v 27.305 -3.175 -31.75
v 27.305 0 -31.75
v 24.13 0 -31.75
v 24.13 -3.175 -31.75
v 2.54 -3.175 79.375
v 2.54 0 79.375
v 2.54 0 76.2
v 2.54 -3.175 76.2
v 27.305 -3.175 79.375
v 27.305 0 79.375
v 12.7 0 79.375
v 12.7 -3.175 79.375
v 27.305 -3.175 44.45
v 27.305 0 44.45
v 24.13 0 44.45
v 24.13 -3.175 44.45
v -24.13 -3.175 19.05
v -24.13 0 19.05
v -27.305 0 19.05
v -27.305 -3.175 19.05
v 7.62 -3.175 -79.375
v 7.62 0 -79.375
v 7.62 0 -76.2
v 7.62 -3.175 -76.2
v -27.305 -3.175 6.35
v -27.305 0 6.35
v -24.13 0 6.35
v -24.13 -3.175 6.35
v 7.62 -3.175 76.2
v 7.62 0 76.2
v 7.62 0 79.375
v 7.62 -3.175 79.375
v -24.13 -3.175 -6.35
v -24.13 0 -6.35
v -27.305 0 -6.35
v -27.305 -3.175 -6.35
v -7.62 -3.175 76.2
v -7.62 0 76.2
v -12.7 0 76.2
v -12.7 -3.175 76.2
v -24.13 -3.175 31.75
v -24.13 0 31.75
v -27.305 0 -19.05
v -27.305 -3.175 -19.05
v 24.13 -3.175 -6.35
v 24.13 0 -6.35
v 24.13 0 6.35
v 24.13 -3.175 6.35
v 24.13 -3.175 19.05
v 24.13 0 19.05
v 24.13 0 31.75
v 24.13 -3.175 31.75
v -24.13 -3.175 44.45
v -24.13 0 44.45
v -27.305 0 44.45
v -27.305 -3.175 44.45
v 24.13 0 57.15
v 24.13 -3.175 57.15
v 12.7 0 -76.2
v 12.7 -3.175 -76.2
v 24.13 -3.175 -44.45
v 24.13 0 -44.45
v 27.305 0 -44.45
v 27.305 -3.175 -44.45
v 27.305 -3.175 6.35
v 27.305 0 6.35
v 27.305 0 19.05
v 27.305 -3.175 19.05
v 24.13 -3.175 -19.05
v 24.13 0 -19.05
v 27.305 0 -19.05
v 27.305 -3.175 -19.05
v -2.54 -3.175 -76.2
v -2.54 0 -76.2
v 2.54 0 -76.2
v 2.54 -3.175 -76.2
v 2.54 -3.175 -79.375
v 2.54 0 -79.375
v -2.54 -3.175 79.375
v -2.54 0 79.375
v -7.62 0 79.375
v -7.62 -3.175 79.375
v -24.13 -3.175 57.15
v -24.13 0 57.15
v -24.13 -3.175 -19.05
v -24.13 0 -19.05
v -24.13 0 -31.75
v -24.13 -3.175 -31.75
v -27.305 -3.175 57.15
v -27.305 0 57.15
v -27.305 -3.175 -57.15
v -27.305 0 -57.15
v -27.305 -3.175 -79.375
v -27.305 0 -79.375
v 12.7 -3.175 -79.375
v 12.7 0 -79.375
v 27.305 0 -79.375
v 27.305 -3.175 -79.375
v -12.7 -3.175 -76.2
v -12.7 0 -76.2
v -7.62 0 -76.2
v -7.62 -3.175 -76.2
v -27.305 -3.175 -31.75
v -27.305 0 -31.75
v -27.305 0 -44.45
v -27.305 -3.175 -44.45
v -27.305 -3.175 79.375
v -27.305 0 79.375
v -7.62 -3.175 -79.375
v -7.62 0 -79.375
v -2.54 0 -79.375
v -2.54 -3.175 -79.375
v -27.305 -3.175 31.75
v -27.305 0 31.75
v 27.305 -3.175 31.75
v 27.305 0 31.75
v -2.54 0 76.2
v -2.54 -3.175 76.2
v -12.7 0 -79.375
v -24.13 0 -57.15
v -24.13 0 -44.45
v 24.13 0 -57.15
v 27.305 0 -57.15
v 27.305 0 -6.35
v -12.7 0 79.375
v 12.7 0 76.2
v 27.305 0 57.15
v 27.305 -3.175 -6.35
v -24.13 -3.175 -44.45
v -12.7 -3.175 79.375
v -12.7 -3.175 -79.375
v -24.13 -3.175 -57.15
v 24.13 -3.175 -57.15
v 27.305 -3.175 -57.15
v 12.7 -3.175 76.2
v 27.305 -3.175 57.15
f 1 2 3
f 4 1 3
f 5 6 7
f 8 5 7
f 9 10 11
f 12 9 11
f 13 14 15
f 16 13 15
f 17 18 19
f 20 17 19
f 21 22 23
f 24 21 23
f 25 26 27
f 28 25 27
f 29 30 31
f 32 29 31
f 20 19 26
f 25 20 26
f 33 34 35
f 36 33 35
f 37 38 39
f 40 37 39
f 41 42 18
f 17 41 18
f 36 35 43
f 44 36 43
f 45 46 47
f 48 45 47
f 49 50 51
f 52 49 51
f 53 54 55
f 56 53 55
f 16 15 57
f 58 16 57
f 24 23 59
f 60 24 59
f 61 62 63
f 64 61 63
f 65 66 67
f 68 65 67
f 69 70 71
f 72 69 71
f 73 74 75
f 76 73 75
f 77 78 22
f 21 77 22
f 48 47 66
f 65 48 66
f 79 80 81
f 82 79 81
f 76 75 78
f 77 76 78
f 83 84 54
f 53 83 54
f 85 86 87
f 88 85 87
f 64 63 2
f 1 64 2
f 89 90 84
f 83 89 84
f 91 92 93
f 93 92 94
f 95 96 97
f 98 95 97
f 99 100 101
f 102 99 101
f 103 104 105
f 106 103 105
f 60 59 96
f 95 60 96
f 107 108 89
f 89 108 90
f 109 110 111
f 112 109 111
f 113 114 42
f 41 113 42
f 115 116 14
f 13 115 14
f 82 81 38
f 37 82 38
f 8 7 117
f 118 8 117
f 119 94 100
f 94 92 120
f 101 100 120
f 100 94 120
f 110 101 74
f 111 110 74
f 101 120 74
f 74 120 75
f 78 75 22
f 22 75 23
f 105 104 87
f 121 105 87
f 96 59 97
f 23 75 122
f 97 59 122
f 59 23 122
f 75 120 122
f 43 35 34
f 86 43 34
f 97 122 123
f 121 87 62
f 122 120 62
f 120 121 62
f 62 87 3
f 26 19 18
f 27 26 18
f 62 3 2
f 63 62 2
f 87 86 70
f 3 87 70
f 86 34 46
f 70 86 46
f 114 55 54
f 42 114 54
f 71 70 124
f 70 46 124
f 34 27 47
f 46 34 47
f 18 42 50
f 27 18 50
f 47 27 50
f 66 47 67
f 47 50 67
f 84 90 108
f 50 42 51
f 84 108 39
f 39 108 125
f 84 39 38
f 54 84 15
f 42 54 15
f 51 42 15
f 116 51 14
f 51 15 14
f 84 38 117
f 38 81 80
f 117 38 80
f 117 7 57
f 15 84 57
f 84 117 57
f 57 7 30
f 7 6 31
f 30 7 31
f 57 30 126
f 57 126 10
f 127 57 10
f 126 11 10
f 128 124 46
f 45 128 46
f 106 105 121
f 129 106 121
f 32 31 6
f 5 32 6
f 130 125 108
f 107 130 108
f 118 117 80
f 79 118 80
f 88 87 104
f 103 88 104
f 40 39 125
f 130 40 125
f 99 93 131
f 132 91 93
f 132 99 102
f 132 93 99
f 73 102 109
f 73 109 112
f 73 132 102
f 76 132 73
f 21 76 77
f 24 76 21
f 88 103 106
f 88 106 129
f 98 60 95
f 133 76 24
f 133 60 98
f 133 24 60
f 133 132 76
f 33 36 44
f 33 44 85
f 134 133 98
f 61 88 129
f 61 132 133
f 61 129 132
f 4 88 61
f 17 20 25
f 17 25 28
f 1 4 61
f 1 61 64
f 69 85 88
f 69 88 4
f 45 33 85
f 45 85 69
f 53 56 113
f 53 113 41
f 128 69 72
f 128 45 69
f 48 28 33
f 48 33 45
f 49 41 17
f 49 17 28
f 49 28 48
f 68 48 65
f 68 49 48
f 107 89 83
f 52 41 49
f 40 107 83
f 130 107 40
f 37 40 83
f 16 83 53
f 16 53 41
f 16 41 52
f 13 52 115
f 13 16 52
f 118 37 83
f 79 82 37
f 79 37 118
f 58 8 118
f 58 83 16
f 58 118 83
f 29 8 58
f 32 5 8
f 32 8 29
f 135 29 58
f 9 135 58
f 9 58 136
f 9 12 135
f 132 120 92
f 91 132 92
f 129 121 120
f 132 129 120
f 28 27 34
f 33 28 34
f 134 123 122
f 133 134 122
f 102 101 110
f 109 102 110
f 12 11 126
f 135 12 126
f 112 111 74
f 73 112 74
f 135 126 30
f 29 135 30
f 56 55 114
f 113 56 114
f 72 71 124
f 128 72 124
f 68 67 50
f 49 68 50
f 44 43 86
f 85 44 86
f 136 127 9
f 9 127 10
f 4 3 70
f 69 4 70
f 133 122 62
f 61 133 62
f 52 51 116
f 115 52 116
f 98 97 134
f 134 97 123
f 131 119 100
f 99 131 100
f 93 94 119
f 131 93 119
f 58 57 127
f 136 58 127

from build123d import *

# Parameters (mm, degrees)
F1_DEPTH = 3.175


with BuildPart() as f1:
    # F0 (on Front) → F1 (new body)
    with BuildSketch(Plane.XZ):
        Polygon((-12.7, 76.2), (-12.7, 79.375), (-27.305, 79.375), (-27.305, 57.15), (-24.13, 57.15), (-24.13, 44.45), (-27.305, 44.45), (-27.305, 31.75), (-24.13, 31.75), (-24.13, 19.05), (-27.305, 19.05), (-27.305, 6.35), (-24.13, 6.35), (-24.13, -6.35), (-27.305, -6.35), (-27.305, -19.05), (-24.13, -19.05), (-24.13, -31.75), (-27.305, -31.75), (-27.305, -44.45), (-24.13, -44.45), (-24.13, -57.15), (-27.305, -57.15), (-27.305, -79.375), (-12.7, -79.375), (-12.7, -76.2), (-7.62, -76.2), (-7.62, -79.375), (-2.54, -79.375), (-2.54, -76.2), (2.54, -76.2), (2.54, -79.375), (7.62, -79.375), (7.62, -76.2), (12.7, -76.2), (12.7, -79.375), (27.305, -79.375), (27.305, -57.15), (24.13, -57.15), (24.13, -44.45), (27.305, -44.45), (27.305, -31.75), (24.13, -31.75), (24.13, -19.05), (27.305, -19.05), (27.305, -6.35), (24.13, -6.35), (24.13, 6.35), (27.305, 6.35), (27.305, 19.05), (24.13, 19.05), (24.13, 31.75), (27.305, 31.75), (27.305, 44.45), (24.13, 44.45), (24.13, 57.15), (27.305, 57.15), (27.305, 79.375), (12.7, 79.375), (12.7, 76.2), (7.62, 76.2), (7.62, 79.375), (2.54, 79.375), (2.54, 76.2), (-2.54, 76.2), (-2.54, 79.375), (-7.62, 79.375), (-7.62, 76.2), align=None)
    extrude(amount=F1_DEPTH)


solid = f1.part
